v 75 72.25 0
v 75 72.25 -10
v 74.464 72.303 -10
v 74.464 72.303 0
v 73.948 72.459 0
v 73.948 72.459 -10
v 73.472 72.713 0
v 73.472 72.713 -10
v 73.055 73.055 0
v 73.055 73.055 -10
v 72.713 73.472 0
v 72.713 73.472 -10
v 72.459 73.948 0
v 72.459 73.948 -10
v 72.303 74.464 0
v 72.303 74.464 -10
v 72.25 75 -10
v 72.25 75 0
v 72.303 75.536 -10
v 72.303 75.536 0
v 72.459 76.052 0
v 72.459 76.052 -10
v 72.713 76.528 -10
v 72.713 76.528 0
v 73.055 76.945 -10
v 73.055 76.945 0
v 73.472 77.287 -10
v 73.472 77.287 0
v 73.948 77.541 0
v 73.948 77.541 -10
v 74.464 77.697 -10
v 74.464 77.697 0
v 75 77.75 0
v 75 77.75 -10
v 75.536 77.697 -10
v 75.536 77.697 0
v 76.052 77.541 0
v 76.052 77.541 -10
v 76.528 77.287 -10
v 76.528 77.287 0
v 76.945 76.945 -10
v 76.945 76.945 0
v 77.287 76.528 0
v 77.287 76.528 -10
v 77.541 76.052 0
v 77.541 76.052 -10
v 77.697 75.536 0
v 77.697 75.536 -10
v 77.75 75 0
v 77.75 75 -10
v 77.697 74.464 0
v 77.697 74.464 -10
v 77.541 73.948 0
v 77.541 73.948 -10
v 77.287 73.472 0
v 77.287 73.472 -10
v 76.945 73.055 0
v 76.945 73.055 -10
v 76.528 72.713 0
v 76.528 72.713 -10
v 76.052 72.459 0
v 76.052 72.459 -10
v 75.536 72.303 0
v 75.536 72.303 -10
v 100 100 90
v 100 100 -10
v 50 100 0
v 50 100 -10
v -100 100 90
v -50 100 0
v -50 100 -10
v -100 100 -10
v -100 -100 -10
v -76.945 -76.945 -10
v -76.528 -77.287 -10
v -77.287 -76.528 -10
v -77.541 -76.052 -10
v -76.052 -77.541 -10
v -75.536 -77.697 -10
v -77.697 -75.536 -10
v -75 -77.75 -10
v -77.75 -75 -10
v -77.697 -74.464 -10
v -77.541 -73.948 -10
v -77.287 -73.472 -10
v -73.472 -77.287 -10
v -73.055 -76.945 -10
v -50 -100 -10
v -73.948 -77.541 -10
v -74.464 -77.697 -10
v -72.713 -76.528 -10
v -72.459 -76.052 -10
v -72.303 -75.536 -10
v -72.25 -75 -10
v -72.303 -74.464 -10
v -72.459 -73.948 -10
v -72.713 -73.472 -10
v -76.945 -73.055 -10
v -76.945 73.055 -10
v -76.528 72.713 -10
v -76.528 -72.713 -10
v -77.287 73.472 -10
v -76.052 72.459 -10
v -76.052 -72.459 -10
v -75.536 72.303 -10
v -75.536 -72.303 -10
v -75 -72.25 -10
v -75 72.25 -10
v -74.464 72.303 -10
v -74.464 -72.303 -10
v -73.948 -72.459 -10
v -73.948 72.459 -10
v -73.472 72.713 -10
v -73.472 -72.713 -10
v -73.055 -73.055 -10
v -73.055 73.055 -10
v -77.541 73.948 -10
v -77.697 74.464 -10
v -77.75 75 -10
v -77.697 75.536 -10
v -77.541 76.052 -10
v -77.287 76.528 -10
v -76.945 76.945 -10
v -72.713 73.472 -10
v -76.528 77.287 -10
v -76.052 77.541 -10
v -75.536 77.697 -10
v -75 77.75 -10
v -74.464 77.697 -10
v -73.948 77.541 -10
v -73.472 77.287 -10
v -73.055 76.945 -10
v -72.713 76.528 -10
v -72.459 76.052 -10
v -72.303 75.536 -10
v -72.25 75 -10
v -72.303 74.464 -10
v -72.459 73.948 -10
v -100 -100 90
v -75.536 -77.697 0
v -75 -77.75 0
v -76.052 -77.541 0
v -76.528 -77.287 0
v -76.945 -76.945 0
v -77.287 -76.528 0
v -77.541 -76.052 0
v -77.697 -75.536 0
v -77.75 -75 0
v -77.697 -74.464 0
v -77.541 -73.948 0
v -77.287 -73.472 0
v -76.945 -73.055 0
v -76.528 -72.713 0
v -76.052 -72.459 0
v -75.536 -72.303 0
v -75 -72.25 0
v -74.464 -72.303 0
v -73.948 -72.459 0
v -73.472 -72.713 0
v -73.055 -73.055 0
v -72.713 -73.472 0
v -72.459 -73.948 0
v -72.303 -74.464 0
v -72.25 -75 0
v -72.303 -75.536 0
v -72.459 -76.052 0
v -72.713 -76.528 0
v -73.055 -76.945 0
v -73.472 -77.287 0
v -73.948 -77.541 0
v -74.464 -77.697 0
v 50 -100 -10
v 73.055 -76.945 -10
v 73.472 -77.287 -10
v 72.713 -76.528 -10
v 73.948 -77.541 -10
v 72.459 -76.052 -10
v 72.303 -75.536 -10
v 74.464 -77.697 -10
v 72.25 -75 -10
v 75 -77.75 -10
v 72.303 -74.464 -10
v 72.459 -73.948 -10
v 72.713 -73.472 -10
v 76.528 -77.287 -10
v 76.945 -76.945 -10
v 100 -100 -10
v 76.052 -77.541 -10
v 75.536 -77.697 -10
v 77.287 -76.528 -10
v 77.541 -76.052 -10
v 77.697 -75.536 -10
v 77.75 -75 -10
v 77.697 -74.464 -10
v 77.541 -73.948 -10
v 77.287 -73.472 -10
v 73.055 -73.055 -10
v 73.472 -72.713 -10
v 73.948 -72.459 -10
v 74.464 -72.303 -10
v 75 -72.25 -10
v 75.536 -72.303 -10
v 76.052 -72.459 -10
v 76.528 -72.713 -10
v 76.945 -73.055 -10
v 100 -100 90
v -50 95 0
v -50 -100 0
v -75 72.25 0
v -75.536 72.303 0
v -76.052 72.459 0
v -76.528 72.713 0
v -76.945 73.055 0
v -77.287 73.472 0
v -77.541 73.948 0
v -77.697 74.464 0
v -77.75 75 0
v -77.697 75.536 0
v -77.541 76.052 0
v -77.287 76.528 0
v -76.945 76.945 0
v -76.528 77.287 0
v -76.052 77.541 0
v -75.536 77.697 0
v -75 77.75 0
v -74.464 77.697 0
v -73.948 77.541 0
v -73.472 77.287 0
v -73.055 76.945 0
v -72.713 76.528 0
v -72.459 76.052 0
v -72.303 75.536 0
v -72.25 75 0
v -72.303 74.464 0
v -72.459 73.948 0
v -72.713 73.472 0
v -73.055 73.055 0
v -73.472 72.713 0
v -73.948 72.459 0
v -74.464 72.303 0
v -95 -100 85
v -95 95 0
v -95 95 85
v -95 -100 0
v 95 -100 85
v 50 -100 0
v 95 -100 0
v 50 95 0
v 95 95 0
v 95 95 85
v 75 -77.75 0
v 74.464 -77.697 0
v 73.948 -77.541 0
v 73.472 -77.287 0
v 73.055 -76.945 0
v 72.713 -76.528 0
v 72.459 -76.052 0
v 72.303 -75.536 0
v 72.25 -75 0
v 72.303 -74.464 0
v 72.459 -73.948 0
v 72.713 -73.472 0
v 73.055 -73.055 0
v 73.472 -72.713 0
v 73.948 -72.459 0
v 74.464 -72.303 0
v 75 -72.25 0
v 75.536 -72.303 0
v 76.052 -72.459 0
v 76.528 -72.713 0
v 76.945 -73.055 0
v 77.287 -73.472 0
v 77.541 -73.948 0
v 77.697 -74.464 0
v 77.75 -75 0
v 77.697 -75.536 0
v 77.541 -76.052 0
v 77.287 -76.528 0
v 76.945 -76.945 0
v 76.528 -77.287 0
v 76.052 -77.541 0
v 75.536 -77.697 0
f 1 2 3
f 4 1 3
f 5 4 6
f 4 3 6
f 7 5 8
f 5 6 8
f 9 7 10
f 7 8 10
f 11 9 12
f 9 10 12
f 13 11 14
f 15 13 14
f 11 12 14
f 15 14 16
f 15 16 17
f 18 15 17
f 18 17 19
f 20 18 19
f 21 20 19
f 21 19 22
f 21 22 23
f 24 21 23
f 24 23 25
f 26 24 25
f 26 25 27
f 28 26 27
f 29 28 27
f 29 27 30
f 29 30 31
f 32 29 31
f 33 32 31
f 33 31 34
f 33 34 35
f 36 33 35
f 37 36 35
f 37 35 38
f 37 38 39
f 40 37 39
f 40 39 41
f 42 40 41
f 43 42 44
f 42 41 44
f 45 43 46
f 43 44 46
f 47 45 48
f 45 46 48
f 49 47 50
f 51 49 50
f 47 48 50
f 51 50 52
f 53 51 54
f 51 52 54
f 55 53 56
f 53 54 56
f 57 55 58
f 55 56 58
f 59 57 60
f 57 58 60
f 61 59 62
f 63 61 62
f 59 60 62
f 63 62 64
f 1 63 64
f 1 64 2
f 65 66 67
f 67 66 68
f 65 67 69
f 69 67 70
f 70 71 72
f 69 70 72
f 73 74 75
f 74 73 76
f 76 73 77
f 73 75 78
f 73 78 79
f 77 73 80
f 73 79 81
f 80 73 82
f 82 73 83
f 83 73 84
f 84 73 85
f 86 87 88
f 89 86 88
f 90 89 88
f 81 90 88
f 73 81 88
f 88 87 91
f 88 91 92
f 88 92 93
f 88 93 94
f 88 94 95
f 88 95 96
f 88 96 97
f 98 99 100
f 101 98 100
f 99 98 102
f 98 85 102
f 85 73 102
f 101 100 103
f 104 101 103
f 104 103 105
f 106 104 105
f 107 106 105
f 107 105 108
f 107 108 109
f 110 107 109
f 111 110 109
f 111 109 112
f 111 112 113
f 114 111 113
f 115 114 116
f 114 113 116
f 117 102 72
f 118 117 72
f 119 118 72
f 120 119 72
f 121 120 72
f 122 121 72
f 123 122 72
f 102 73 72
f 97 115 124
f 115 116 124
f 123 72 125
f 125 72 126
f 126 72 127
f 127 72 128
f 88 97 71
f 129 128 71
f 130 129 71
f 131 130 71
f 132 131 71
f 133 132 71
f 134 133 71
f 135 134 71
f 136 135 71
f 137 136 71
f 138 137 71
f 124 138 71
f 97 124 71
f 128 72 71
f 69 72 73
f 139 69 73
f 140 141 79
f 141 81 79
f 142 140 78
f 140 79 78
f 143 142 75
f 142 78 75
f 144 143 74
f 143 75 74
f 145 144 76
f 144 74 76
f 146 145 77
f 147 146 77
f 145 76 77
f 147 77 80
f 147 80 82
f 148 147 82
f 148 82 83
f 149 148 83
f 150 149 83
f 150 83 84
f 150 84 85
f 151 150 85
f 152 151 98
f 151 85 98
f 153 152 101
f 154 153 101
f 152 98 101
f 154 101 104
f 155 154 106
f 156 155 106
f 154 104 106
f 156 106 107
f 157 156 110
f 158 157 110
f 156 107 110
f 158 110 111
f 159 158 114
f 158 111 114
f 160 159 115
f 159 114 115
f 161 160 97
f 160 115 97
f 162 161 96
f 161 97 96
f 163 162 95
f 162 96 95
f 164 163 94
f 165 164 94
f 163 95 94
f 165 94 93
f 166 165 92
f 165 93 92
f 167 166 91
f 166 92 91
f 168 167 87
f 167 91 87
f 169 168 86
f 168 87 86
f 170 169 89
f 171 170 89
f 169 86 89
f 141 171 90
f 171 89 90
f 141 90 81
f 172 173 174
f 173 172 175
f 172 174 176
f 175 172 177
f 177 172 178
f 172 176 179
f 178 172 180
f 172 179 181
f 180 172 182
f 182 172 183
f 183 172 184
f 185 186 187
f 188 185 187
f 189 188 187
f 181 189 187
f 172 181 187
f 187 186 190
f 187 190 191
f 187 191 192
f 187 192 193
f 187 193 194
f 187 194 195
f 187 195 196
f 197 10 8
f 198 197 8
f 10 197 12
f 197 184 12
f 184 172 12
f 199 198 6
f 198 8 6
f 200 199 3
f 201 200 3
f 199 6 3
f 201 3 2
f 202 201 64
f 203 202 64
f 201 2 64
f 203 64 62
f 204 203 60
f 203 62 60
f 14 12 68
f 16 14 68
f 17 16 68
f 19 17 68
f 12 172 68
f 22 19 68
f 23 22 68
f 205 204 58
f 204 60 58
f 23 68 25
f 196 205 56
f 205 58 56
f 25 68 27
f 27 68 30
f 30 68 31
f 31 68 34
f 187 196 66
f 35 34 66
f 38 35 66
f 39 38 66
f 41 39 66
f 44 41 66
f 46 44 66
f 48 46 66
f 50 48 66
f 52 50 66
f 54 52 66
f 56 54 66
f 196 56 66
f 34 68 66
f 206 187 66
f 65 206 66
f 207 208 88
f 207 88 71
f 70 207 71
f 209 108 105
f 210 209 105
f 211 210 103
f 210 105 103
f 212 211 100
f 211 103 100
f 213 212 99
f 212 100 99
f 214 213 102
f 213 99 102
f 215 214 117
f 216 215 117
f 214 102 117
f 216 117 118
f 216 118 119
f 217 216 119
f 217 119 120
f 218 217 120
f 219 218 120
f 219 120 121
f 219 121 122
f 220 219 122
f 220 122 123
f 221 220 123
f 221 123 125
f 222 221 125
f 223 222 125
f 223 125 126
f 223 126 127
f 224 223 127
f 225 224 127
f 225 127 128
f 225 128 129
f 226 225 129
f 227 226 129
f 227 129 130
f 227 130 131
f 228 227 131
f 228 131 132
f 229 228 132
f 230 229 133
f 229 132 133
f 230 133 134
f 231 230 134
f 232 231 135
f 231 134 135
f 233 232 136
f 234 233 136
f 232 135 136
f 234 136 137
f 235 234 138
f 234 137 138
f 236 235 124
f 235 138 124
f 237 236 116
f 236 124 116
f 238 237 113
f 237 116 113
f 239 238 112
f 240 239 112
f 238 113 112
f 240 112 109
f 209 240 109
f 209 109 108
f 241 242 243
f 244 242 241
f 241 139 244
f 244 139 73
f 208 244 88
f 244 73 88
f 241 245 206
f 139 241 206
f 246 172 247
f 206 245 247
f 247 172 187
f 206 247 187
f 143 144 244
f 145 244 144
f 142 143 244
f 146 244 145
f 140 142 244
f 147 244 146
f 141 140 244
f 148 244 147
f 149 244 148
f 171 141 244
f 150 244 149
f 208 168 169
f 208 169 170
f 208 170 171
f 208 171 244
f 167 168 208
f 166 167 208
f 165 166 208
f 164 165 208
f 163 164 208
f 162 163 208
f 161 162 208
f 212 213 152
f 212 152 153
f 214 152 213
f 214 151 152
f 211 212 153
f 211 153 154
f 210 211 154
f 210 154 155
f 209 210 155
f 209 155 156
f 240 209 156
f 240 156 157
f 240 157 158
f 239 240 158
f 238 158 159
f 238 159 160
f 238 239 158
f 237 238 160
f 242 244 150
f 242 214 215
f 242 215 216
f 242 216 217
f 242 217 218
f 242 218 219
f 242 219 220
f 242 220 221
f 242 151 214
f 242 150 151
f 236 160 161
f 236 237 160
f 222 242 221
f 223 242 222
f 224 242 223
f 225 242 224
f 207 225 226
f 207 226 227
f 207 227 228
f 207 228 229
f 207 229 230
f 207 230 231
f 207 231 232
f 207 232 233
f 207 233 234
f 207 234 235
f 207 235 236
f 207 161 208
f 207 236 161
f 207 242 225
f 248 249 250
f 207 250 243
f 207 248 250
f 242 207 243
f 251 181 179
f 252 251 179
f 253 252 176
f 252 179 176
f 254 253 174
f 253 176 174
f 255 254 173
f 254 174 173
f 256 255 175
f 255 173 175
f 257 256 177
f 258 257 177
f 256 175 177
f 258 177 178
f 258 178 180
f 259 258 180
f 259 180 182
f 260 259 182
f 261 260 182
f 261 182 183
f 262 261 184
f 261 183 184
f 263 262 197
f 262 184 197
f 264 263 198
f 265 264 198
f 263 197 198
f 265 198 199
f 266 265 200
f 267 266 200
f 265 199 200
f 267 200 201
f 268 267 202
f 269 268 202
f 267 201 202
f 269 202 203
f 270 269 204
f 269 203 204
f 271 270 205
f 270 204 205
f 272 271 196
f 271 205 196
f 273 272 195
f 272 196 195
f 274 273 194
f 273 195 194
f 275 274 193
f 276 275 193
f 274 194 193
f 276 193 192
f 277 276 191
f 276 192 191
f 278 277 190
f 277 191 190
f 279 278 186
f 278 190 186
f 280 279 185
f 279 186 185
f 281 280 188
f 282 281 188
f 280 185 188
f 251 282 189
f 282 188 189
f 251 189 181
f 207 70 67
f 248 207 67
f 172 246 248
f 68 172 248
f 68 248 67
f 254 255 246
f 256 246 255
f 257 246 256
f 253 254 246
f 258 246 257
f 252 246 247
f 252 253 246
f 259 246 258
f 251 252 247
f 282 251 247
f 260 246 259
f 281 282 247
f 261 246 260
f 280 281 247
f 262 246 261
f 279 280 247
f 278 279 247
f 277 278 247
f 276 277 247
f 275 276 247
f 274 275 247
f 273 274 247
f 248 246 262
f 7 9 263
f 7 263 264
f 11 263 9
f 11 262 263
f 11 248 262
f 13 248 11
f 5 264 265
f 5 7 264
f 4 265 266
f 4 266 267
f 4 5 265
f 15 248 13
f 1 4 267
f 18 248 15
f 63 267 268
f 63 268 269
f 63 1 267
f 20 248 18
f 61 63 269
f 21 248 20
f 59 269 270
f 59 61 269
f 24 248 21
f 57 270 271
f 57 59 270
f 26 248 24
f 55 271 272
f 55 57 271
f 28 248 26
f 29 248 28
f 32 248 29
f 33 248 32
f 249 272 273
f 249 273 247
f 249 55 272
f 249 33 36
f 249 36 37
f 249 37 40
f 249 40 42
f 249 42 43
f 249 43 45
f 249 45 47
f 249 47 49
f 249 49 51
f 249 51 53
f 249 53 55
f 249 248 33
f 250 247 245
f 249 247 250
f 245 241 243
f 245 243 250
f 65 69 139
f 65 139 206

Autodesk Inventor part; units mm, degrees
ref_plane "YZ Plane" through (0, 0, 0) normal (1, 0, 0) x (0, 1, 0)
ref_plane "XZ Plane" through (0, 0, 0) normal (0, 1, 0) x (-1, 0, 0)
ref_plane "XY Plane" through (0, 0, 0) normal (0, 0, 1) x (1, 0, 0)
sketch "Sketch3" plane through (0, 0, 0) normal (0, 0, 1) x (1, 0, 0)
  line L0 (-100, -100) -> (100, -100)
  line L1 (100, -100) -> (100, 100)
  line L2 (100, 100) -> (-100, 100)
  line L3 (-100, 100) -> (-100, -100)
  line L4 (-100, -100) -> (100, 100) construction
  line L5 (100, -100) -> (-100, 100) construction
  point P0 (0, 0)
  dimension "d8" = 200
  dimension "d9" = 200
extrude "Extrusion2" add sketch "Sketch3" along normal blind 90
shell "Shell2" thickness 5 removed faces 2 at (-33.3333, -100, 30) at (-33.3333, -33.3333, 0)
sketch "Sketch4" plane through (0, 0, 0) normal (0, 0, 1) x (1, 0, 0)
  line L0 (100, -100) -> (100, 100) construction
  line L1 (100, 100) -> (-100, 100) construction
  line L2 (-100, 100) -> (-100, -100) construction
  line L3 (-100, -100) -> (100, -100) construction
  line L4 (-100, 100) -> (100, 100)
  line L5 (100, 100) -> (100, -100)
  line L6 (-100, -100) -> (-100, 100)
  line L7 (0, -140) -> (0, 140) projected
  point P0 (0, 0)
  point P1 (-75, -75)
  point P2 (75, -75)
  point P3 (-75, 75)
  point P4 (75, 75)
  dimension "d13" = 150
  dimension "d14" = 25
  dimension "d15" = 150
sketch "Sketch5" plane through (0, 0, 0) normal (0, 0, 1) x (1, 0, 0)
  line L0 (-100, 100) -> (-100, -100) projected
  line L1 (100, 100) -> (-100, 100)
  line L2 (-100, 100) -> (-100, -100)
  line L3 (100, -100) -> (100, 100)
  line L4 (-100, -100) -> (100, -100) projected
  line L5 (100, -100) -> (50, -100)
  line L6 (50, -100) -> (50, 100)
  line L7 (-50, -100) -> (-50, 100)
  point P0 (0, 0)
  dimension "d16" = 50
  dimension "d17" = 50
extrude "Extrusion3" add sketch "Sketch5" against normal blind 10 contours L1 L7 L4 L0 | L1 L3 L4 L6
hole "Hole1" at (-75, -75, 0) at (75, -75, 0) at (-75, 75, 0) at (75, 75, 0) direction (0, 0, -1) diameter 5.5 end through all clearance for "Countersunk Flat Head Screw ISO 2009/7046" size "M5" standard "ISO"
equation "\"d17\" = d16"
properties part number "KN-00-00-01" material "PET Plastic"
